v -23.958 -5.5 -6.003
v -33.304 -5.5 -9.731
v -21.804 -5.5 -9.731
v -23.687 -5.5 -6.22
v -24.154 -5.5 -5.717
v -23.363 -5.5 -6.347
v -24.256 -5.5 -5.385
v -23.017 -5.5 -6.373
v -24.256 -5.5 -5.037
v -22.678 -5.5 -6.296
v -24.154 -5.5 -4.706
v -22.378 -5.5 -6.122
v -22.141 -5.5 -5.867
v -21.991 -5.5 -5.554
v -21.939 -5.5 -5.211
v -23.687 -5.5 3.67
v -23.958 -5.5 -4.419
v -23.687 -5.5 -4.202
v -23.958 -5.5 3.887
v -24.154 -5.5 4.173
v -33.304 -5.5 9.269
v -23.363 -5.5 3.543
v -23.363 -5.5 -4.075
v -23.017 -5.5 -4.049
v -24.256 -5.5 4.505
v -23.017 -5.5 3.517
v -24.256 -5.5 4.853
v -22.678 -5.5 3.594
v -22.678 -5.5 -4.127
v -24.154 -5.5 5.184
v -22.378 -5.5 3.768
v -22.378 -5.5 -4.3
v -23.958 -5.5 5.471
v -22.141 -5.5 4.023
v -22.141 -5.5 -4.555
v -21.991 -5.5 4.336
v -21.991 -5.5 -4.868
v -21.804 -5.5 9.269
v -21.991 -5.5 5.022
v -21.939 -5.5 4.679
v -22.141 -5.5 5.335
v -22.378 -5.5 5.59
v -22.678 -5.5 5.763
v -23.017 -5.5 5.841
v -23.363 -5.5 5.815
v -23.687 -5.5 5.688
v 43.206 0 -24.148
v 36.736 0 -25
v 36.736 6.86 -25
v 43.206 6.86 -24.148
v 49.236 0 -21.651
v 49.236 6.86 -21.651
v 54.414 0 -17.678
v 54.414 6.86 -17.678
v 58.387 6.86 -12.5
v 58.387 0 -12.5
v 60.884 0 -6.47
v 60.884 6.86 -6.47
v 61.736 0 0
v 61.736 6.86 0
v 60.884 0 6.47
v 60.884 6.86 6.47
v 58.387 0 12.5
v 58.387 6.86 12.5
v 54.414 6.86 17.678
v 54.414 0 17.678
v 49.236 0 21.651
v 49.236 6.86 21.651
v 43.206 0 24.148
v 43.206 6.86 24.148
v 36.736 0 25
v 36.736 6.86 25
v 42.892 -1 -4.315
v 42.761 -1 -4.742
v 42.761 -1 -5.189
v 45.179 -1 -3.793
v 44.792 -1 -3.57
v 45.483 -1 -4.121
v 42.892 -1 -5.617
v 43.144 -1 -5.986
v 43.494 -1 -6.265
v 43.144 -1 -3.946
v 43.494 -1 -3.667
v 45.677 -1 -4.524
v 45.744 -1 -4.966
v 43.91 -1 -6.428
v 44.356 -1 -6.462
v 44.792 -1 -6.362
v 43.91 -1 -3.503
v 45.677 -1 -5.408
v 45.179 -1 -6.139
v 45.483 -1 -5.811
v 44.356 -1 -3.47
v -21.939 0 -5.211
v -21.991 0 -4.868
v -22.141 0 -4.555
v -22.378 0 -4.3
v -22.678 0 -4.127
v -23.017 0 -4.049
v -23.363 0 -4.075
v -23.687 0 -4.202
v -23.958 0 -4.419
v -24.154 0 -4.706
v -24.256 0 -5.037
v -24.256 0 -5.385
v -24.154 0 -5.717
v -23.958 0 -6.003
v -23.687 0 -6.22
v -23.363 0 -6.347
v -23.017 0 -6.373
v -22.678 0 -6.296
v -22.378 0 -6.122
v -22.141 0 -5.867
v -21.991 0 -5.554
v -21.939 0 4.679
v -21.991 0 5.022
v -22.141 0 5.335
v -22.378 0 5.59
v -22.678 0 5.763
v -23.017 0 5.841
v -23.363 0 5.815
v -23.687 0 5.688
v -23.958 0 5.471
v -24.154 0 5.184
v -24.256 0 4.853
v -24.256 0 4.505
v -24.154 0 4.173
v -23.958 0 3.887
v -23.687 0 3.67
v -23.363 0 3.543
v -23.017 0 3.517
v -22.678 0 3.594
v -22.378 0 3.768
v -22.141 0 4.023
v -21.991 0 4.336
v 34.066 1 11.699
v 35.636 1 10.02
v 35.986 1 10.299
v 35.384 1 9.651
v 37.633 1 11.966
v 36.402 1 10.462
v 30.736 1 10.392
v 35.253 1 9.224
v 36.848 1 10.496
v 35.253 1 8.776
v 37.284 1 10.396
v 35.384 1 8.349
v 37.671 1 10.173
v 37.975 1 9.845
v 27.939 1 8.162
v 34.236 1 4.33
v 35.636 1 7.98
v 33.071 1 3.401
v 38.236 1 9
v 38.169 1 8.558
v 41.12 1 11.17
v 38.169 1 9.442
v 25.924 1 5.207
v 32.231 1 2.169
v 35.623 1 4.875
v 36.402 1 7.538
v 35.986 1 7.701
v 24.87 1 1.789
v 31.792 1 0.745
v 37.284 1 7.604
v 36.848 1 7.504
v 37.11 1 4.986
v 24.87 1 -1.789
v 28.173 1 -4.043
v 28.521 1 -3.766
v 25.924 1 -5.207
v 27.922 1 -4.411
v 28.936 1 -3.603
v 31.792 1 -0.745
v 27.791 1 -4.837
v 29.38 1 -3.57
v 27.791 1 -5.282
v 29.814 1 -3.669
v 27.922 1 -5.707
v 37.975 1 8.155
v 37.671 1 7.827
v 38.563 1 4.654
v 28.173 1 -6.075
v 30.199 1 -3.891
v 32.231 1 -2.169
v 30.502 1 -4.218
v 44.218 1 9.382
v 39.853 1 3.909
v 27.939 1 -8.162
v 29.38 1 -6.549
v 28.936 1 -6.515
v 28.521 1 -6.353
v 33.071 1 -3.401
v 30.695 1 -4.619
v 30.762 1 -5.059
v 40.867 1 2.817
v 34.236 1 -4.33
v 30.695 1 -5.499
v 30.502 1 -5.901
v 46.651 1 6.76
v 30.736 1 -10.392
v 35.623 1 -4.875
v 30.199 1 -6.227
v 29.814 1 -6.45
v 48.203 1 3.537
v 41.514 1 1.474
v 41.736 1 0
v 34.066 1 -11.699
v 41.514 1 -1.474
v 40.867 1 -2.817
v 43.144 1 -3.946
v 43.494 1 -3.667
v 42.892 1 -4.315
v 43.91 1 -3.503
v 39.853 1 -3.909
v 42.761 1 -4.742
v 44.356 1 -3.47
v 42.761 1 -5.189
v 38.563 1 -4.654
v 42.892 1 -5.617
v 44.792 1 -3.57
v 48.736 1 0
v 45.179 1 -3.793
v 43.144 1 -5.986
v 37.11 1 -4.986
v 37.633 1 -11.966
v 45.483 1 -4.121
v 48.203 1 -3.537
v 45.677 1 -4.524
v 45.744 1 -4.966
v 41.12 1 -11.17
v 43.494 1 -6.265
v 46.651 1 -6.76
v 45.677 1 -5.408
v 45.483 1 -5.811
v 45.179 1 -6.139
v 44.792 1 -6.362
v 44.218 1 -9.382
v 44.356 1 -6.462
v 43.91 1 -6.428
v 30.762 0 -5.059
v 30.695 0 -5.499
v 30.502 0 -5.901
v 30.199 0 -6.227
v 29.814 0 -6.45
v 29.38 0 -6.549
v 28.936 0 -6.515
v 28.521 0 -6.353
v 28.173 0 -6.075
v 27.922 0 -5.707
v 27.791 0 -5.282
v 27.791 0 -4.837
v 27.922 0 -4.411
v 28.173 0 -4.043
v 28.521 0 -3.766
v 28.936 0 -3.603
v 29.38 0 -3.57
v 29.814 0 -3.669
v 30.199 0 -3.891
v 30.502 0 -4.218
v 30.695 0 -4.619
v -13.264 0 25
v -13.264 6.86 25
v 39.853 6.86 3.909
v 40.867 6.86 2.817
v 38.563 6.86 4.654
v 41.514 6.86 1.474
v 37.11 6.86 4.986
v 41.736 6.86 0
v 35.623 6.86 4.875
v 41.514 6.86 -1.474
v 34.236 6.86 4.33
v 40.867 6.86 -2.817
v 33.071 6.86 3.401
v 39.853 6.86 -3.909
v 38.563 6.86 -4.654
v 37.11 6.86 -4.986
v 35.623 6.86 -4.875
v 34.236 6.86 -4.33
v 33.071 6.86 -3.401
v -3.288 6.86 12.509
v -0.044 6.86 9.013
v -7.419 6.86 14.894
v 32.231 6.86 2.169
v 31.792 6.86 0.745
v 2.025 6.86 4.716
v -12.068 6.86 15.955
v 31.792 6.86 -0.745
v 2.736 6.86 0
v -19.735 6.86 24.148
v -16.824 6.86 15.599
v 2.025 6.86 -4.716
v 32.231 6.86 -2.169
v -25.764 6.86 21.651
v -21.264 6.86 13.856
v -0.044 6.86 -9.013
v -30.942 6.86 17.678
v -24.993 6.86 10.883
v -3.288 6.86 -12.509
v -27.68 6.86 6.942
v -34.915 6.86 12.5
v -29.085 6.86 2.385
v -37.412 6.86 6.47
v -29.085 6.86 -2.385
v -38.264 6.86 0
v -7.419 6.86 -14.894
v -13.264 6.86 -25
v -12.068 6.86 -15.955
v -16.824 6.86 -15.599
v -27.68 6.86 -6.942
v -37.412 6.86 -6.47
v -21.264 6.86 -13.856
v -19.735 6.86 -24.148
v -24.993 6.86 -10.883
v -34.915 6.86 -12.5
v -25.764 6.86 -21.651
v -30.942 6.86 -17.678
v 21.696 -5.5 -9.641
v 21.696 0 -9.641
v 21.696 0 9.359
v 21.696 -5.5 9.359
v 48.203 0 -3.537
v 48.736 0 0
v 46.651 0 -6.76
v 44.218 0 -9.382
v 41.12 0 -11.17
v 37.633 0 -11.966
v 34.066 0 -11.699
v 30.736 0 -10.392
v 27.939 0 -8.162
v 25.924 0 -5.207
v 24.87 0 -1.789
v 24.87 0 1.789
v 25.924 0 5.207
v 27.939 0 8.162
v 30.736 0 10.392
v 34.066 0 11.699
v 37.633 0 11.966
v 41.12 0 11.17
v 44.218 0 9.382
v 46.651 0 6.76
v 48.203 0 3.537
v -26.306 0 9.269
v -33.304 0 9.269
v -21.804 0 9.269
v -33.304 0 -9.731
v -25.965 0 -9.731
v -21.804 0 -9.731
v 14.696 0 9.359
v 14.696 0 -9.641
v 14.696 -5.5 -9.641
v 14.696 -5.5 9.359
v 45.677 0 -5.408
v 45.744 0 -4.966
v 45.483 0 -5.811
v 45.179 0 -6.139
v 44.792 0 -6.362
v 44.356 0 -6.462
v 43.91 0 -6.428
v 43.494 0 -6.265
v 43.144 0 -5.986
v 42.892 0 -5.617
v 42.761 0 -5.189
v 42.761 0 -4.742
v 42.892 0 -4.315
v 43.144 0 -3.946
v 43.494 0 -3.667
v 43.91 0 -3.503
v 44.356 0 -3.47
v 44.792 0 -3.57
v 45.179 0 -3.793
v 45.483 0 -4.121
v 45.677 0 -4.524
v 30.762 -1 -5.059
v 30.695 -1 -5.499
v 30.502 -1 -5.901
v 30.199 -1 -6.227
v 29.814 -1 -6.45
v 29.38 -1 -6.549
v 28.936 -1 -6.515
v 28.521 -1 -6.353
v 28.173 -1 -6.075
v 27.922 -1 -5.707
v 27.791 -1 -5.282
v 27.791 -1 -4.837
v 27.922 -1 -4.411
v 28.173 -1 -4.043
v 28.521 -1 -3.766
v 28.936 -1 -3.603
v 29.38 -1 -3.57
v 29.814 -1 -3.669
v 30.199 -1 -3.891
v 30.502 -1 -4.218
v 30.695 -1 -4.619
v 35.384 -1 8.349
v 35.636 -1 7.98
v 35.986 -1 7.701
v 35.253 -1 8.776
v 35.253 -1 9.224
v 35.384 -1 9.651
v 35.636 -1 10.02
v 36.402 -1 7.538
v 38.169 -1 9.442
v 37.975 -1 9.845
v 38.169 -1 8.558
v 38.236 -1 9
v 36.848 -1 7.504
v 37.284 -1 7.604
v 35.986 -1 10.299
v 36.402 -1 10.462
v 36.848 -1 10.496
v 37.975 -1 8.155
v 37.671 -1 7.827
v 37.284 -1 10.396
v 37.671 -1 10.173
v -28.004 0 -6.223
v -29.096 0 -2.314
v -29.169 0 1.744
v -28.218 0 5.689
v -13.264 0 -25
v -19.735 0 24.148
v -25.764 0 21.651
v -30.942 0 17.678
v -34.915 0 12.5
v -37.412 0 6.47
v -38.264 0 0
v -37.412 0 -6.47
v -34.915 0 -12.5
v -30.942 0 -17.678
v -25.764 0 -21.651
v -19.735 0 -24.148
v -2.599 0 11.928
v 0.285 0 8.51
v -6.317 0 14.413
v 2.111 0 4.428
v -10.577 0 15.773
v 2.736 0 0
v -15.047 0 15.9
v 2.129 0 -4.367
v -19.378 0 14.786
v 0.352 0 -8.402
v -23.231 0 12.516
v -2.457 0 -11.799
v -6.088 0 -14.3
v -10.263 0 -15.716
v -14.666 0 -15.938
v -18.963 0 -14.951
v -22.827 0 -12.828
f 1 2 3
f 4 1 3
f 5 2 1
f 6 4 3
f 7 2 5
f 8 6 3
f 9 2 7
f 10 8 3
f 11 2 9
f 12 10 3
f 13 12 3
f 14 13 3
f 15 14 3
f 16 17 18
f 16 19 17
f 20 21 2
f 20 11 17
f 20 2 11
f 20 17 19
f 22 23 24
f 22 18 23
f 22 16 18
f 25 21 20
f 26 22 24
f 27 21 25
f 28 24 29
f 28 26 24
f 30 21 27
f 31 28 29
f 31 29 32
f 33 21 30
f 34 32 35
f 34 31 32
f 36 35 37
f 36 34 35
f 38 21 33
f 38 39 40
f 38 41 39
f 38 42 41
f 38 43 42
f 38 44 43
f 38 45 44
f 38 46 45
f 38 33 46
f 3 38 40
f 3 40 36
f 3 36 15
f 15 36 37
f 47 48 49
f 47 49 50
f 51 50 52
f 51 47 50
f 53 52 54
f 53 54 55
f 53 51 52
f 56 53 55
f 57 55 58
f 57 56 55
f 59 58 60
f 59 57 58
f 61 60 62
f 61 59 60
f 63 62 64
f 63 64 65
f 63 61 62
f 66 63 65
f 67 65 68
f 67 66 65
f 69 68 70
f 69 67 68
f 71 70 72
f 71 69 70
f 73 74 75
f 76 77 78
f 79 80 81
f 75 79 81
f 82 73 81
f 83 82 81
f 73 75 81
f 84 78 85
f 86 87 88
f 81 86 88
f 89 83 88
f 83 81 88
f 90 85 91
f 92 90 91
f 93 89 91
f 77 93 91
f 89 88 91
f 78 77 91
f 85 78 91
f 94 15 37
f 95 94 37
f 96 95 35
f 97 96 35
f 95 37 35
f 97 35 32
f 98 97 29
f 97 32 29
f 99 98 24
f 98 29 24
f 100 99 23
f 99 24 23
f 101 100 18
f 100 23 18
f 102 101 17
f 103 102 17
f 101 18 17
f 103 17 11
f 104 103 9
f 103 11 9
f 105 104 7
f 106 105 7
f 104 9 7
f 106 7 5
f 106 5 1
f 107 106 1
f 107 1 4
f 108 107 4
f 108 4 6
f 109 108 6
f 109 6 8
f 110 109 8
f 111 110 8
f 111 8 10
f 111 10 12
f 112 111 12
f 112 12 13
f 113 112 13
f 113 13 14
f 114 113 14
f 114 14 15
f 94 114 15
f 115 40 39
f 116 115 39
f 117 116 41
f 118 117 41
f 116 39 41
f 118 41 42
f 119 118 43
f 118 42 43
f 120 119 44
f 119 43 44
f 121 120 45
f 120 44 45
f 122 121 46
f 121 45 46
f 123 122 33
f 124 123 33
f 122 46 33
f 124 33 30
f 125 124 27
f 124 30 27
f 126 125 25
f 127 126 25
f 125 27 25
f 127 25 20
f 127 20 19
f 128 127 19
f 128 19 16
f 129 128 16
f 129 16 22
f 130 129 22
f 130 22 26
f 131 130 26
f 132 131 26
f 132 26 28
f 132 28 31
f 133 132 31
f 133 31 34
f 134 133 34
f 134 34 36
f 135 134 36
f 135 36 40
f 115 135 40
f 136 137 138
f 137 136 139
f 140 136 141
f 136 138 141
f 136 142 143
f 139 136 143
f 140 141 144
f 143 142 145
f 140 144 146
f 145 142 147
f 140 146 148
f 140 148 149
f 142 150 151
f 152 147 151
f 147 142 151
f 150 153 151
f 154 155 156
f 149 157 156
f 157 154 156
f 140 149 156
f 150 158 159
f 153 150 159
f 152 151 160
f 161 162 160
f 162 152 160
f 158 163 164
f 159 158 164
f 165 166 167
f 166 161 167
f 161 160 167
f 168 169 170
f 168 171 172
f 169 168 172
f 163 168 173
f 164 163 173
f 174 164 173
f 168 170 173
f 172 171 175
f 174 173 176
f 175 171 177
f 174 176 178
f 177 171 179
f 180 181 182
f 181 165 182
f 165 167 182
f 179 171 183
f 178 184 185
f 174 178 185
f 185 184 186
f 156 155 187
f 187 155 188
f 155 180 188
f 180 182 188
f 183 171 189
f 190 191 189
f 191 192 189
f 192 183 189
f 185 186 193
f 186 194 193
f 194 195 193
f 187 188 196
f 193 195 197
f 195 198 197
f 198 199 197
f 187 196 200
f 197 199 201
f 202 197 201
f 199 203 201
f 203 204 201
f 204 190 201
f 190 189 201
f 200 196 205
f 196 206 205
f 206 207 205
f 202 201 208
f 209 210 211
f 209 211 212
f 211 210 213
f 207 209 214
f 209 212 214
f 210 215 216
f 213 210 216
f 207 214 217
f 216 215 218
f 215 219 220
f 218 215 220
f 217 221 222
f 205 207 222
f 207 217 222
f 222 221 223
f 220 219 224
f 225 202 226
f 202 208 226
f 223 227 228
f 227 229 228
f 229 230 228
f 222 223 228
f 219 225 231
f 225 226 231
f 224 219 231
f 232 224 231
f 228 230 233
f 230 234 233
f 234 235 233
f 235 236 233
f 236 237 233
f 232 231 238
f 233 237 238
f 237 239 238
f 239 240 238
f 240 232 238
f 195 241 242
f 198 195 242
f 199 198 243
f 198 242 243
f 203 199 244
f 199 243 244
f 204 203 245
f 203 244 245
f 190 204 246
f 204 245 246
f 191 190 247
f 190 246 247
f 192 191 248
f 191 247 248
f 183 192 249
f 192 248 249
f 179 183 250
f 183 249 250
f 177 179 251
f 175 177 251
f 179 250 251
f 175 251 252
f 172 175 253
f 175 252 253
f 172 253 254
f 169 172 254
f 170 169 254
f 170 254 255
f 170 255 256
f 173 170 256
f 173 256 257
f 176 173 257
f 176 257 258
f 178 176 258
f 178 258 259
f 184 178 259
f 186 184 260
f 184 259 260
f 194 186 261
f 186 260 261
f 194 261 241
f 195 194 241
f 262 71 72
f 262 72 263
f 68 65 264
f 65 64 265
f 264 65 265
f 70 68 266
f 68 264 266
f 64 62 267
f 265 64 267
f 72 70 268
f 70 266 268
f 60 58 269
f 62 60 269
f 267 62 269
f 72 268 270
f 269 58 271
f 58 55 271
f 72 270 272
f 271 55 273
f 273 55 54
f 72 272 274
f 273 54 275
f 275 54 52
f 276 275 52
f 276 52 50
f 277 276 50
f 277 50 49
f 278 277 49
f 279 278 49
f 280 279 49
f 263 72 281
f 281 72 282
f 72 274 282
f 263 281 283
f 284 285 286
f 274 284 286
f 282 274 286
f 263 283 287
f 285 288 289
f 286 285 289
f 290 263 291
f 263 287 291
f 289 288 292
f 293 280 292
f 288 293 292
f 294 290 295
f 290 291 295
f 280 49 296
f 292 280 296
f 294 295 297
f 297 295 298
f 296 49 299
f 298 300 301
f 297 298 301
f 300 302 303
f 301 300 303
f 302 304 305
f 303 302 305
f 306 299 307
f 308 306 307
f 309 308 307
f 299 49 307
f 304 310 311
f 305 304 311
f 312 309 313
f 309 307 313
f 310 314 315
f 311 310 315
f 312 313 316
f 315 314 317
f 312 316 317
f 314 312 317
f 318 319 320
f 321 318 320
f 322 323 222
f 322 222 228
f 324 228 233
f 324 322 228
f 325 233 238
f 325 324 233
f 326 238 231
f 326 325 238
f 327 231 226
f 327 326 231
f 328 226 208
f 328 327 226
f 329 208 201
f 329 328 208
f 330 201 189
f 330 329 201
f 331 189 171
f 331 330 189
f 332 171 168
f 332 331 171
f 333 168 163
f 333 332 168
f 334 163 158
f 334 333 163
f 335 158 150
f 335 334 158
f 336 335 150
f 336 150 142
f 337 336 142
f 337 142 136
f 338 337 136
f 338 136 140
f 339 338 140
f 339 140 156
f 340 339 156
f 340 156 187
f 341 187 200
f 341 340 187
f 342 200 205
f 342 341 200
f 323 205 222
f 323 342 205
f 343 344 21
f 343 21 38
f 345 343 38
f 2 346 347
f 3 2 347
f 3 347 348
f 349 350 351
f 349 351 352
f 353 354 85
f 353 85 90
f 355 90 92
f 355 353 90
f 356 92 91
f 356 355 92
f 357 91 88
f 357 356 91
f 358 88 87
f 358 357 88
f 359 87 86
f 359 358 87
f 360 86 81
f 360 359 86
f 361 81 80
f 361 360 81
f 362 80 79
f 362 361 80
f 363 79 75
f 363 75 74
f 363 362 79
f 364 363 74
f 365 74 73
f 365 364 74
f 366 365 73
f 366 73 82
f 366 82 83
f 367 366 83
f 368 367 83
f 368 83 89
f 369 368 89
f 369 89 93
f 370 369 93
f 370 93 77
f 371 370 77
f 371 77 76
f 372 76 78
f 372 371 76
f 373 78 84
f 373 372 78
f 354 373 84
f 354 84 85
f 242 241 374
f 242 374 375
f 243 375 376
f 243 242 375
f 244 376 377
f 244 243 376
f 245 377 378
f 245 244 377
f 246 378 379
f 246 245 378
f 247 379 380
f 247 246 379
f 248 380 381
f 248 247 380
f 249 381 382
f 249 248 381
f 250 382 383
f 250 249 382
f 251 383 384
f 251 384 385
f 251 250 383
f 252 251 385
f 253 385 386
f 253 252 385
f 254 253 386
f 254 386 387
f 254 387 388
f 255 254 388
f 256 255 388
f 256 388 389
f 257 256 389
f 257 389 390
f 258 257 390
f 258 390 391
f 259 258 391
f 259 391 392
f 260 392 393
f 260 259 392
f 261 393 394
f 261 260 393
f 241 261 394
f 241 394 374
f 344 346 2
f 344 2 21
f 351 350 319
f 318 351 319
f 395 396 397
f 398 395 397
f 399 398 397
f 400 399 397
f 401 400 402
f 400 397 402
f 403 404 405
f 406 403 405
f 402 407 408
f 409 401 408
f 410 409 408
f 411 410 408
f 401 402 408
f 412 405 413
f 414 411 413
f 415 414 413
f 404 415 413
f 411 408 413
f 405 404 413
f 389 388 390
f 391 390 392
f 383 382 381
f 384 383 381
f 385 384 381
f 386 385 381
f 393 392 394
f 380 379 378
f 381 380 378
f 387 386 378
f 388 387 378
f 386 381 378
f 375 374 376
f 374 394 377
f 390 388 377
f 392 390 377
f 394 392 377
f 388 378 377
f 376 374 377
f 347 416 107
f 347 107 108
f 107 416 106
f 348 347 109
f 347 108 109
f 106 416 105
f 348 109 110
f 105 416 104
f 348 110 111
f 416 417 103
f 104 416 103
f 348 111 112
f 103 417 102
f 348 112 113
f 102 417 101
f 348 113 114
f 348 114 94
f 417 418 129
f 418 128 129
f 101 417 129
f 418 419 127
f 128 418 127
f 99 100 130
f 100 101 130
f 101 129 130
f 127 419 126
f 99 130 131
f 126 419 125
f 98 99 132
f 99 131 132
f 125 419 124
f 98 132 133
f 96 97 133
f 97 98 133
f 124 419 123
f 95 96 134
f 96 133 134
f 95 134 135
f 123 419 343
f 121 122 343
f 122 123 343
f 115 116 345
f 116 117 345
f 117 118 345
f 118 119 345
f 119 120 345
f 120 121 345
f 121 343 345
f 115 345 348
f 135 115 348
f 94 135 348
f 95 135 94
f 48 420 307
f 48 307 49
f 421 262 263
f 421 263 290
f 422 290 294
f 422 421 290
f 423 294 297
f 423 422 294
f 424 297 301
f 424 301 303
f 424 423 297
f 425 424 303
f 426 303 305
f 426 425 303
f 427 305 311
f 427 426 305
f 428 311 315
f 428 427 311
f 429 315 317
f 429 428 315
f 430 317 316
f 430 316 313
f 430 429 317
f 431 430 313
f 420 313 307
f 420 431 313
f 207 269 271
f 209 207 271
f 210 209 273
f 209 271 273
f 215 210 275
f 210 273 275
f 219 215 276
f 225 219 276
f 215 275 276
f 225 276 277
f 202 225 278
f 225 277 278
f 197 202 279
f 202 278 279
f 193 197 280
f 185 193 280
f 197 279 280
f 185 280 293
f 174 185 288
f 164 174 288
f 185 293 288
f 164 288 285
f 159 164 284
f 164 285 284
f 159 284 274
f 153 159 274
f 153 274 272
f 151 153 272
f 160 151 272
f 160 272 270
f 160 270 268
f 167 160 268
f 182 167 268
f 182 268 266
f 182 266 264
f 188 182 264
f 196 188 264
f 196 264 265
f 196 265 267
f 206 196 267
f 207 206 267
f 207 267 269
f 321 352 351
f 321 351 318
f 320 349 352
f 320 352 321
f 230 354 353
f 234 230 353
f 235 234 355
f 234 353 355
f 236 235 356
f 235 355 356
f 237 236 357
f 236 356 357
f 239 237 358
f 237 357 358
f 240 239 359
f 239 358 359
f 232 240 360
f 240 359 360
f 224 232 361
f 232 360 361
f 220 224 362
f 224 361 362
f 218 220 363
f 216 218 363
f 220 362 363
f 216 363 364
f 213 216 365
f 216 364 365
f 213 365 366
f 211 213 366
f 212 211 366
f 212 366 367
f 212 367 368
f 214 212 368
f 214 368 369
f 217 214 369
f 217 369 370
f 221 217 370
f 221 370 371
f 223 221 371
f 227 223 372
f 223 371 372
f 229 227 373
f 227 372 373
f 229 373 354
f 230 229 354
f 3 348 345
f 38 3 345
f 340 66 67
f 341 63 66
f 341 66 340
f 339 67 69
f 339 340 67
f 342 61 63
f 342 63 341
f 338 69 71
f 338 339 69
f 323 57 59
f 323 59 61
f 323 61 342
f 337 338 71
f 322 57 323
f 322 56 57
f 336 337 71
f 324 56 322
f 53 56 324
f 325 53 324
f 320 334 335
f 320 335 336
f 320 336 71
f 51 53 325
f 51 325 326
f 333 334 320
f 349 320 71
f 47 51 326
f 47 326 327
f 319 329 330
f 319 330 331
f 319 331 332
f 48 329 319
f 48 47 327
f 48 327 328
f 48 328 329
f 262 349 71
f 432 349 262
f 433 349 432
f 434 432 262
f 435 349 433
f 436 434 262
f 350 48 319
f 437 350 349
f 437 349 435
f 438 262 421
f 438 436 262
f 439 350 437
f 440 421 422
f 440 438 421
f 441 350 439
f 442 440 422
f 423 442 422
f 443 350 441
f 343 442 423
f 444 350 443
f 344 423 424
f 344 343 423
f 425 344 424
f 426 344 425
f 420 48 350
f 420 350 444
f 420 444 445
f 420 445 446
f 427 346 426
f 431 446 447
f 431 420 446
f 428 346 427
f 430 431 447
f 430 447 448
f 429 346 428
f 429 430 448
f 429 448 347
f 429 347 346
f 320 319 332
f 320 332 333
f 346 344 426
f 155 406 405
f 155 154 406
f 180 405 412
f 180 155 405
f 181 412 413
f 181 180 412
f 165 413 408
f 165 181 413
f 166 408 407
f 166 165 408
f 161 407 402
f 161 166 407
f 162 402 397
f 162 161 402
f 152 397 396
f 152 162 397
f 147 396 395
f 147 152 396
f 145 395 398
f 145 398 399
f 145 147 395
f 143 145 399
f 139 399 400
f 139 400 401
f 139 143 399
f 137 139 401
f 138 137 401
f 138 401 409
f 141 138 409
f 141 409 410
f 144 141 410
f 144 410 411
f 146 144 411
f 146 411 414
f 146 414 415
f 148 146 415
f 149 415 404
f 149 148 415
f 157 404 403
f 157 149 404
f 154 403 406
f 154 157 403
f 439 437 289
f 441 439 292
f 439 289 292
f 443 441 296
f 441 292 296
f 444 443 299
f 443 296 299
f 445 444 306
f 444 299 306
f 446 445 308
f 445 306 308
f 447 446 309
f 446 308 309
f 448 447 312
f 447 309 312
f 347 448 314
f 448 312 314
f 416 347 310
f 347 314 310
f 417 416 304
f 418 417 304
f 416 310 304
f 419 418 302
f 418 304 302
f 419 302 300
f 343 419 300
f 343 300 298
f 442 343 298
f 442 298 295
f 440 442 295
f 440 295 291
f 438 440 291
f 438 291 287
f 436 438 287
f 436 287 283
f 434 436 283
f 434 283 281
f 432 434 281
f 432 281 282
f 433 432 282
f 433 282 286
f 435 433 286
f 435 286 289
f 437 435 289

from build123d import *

# Parameters (mm, degrees)
BOSS_EXTRUDE1_DEPTH      = 6.86
SKETCH2_R                = 5
SKETCH2_R_2              = 16
CUT_EXTRUDE1_DEPTH       = 6.86
SKETCH3_W                = 11.5
SKETCH3_H                = 19
SKETCH3_W_2              = 7
BOSS_EXTRUDE2_DEPTH      = 5.5
SKETCH4_R                = 1.165
CUT_EXTRUDE2_DEPTH       = 12.5
SKETCH6_R                = 12
CUT_EXTRUDE3_DEPTH       = 1
SKETCH7_R                = 1.5
SKETCH7_R_2              = 1.493707415
BOSS_EXTRUDE5_DEPTH      = 1
BOSS_EXTRUDE5_DEPTH_BACK = 1


with BuildPart() as part:
    # Sketch1 → Boss-Extrude1 (new body)
    with BuildSketch(Plane(origin=(0, 0, 0), x_dir=(1, 0, 0), z_dir=(0, 1, 0))):
        with BuildLine():
            Line((-13.264052164, 25), (36.735947836, 25))
            ThreePointArc((36.735947836, 25), (61.735947836, 0), (36.735947836, -25))
            Line((36.735947836, -25), (-13.264052164, -25))
            ThreePointArc((-13.264052164, -25), (-38.264052164, 0), (-13.264052164, 25))
        make_face()
    extrude(amount=BOSS_EXTRUDE1_DEPTH)

    # Sketch2 → Cut-Extrude1 (cut)
    with BuildSketch(Plane(origin=(0, 6.86, 0), x_dir=(1, 0, 0), z_dir=(0, 1, 0))):
        with Locations((36.735947836, 0)):
            Circle(SKETCH2_R)
        with Locations((-13.264052164, 0)):
            Circle(SKETCH2_R_2)
    extrude(amount=-CUT_EXTRUDE1_DEPTH, mode=Mode.SUBTRACT)

    # Sketch3 → Boss-Extrude2 (add)
    with BuildSketch(Plane.XZ):
        with Locations((-27.554052164, -0.231081814)):
            Rectangle(SKETCH3_W, SKETCH3_H)
        with Locations((18.195874459, -0.141240273)):
            Rectangle(SKETCH3_W_2, SKETCH3_H)
    extrude(amount=BOSS_EXTRUDE2_DEPTH)

    # Sketch4 → Cut-Extrude2 (cut)
    with BuildSketch(Plane.XZ.offset(5.5)):
        with Locations((-23.104052164, 4.678918186)):
            Circle(SKETCH4_R)
        with Locations((-23.104052164, -5.211081814)):
            Circle(SKETCH4_R)
    extrude(amount=-CUT_EXTRUDE2_DEPTH, mode=Mode.SUBTRACT)

    # Sketch6 → Cut-Extrude3 (cut)
    with BuildSketch(Plane(origin=(0, 0, 0), x_dir=(1, 0, 0), z_dir=(0, 1, 0))):
        with Locations((36.735947836, 0)):
            Circle(SKETCH6_R)
    extrude(amount=CUT_EXTRUDE3_DEPTH, mode=Mode.SUBTRACT)

    # Sketch7 → Boss-Extrude5 (add, two sides)
    with BuildSketch(Plane(origin=(0, 0, 0), x_dir=(1, 0, 0), z_dir=(0, 1, 0))) as boss_extrude5_sk:
        with Locations((36.735947836, -9)):
            Circle(SKETCH7_R)
        with Locations((29.268034032, 5.059173887)):
            Circle(SKETCH7_R_2)
        with Locations((44.243842587, 4.965825904)):
            Circle(SKETCH7_R)
    extrude(amount=BOSS_EXTRUDE5_DEPTH)
    extrude(boss_extrude5_sk.sketch, amount=-BOSS_EXTRUDE5_DEPTH_BACK)


solid = part.part
